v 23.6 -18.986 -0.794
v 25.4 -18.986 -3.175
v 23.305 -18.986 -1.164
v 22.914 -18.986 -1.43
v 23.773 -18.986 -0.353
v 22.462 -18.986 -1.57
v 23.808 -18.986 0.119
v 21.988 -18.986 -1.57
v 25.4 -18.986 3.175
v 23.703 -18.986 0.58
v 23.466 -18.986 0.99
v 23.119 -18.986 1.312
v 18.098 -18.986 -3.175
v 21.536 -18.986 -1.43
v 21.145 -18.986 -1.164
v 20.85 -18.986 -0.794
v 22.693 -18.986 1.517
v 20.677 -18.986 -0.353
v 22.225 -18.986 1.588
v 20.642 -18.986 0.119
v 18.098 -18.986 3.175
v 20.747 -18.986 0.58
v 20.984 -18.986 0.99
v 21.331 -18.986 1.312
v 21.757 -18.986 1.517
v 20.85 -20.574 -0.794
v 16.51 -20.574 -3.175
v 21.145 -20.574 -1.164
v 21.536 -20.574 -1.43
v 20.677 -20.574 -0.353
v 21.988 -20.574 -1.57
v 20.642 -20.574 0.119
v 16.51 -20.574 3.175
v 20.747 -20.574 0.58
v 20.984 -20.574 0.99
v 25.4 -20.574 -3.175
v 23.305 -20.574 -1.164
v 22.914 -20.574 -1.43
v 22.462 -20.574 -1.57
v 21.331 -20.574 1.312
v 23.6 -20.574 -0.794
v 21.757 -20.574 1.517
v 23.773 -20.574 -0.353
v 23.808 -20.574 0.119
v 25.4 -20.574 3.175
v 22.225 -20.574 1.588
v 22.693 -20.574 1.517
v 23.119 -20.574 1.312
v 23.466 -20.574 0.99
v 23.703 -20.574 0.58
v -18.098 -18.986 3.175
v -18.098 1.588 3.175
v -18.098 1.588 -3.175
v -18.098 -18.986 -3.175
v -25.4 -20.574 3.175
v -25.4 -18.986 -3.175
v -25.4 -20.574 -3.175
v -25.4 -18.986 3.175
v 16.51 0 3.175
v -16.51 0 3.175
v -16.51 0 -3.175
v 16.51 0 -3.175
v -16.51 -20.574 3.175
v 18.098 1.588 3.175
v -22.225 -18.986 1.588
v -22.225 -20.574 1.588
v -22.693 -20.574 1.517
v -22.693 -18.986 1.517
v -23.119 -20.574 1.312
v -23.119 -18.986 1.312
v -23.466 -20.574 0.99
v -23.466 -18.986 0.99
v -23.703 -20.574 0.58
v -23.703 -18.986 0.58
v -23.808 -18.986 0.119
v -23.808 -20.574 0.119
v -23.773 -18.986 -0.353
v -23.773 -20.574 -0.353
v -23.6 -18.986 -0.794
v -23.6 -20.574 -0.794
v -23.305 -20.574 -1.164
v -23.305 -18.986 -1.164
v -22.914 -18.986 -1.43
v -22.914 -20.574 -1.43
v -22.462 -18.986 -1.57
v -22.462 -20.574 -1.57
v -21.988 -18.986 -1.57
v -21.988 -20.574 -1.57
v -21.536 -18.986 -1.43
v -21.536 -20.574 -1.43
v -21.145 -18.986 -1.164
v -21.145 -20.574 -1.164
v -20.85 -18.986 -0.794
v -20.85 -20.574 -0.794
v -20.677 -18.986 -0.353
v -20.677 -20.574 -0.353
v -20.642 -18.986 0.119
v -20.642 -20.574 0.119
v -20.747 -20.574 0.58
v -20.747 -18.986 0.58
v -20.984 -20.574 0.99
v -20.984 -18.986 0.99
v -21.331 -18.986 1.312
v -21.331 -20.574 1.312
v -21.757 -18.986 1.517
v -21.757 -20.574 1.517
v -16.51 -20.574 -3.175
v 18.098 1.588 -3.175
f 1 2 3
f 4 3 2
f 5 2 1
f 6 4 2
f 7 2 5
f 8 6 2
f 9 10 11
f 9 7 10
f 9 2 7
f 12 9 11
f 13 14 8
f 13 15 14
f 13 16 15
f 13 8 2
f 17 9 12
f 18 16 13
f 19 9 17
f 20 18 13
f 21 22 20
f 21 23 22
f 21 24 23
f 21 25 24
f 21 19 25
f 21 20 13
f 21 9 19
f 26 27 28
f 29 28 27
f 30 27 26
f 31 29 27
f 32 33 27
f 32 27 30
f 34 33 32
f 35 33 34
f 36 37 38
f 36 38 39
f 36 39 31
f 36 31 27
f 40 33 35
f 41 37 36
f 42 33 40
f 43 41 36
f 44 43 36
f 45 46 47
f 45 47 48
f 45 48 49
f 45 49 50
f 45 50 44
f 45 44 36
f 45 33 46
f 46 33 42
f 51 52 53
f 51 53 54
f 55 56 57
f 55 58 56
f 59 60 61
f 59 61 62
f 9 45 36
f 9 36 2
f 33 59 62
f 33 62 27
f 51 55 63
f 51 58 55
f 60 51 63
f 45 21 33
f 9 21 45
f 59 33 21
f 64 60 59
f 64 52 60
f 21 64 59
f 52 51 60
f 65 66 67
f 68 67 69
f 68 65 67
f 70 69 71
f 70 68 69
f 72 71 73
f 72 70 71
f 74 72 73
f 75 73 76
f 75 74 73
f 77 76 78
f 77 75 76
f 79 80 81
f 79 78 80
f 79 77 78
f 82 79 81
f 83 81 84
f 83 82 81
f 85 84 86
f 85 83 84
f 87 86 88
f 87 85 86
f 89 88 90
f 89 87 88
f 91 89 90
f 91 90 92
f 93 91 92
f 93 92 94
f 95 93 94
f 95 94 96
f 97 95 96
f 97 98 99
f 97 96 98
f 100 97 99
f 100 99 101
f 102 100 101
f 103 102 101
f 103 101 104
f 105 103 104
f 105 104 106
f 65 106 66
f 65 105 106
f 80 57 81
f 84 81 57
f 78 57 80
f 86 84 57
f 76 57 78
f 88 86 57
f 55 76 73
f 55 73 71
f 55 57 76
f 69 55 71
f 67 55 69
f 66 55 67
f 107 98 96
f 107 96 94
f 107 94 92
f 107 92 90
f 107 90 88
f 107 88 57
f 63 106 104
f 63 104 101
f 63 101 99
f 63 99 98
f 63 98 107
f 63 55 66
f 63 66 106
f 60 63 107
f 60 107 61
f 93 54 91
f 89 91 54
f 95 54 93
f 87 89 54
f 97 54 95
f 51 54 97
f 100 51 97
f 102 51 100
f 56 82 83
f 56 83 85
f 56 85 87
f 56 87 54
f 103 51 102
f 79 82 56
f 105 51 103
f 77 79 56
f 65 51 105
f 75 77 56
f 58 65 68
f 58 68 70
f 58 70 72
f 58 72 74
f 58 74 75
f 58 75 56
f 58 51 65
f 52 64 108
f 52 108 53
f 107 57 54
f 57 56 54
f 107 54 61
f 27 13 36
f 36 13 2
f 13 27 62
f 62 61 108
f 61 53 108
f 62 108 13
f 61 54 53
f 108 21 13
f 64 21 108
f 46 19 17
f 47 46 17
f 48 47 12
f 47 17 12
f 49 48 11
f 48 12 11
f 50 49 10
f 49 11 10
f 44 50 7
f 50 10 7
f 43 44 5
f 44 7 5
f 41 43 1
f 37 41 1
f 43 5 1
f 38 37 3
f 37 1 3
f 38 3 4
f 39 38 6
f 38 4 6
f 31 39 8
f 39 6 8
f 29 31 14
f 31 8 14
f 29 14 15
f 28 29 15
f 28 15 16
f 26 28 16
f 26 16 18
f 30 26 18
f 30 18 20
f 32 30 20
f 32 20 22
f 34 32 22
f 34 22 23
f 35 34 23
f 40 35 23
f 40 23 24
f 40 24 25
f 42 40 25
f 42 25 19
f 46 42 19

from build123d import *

# Parameters (mm, degrees)
EXTRUDE_THIN1_DEPTH = 3.175
SKETCH2_R           = 1.5875
CUT_EXTRUDE1_DEPTH  = 2.54


with BuildPart() as part:
    # Sketch1 → Extrude-Thin1 (new, symmetric)
    with BuildSketch(Plane.XY):
        Polygon((-25.4, -20.574), (-16.51, -20.574), (-16.51, 0), (16.51, 0), (16.51, -20.574), (25.4, -20.574), (25.4, -18.9865), (18.0975, -18.9865), (18.0975, 1.5875), (-18.0975, 1.5875), (-18.0975, -18.9865), (-25.4, -18.9865), align=None)
    extrude(amount=EXTRUDE_THIN1_DEPTH, both=True)

    # Sketch2 → Cut-Extrude1 (cut)
    with BuildSketch(Plane(origin=(0, -18.9865, 0), x_dir=(1, 0, 0), z_dir=(0, 1, 0))):
        with Locations(Location((22.225, 0, 0), (0, 0, 270))):
            Circle(SKETCH2_R)
    cut_extrude1 = extrude(amount=-CUT_EXTRUDE1_DEPTH, mode=Mode.SUBTRACT)

    # Mirror1: Cut-Extrude1 across plane
    add(cut_extrude1.mirror(Plane(origin=(0, 0, 0), x_dir=(0, 0, 1), z_dir=(1, 0, 0))), mode=Mode.SUBTRACT)


solid = part.part
